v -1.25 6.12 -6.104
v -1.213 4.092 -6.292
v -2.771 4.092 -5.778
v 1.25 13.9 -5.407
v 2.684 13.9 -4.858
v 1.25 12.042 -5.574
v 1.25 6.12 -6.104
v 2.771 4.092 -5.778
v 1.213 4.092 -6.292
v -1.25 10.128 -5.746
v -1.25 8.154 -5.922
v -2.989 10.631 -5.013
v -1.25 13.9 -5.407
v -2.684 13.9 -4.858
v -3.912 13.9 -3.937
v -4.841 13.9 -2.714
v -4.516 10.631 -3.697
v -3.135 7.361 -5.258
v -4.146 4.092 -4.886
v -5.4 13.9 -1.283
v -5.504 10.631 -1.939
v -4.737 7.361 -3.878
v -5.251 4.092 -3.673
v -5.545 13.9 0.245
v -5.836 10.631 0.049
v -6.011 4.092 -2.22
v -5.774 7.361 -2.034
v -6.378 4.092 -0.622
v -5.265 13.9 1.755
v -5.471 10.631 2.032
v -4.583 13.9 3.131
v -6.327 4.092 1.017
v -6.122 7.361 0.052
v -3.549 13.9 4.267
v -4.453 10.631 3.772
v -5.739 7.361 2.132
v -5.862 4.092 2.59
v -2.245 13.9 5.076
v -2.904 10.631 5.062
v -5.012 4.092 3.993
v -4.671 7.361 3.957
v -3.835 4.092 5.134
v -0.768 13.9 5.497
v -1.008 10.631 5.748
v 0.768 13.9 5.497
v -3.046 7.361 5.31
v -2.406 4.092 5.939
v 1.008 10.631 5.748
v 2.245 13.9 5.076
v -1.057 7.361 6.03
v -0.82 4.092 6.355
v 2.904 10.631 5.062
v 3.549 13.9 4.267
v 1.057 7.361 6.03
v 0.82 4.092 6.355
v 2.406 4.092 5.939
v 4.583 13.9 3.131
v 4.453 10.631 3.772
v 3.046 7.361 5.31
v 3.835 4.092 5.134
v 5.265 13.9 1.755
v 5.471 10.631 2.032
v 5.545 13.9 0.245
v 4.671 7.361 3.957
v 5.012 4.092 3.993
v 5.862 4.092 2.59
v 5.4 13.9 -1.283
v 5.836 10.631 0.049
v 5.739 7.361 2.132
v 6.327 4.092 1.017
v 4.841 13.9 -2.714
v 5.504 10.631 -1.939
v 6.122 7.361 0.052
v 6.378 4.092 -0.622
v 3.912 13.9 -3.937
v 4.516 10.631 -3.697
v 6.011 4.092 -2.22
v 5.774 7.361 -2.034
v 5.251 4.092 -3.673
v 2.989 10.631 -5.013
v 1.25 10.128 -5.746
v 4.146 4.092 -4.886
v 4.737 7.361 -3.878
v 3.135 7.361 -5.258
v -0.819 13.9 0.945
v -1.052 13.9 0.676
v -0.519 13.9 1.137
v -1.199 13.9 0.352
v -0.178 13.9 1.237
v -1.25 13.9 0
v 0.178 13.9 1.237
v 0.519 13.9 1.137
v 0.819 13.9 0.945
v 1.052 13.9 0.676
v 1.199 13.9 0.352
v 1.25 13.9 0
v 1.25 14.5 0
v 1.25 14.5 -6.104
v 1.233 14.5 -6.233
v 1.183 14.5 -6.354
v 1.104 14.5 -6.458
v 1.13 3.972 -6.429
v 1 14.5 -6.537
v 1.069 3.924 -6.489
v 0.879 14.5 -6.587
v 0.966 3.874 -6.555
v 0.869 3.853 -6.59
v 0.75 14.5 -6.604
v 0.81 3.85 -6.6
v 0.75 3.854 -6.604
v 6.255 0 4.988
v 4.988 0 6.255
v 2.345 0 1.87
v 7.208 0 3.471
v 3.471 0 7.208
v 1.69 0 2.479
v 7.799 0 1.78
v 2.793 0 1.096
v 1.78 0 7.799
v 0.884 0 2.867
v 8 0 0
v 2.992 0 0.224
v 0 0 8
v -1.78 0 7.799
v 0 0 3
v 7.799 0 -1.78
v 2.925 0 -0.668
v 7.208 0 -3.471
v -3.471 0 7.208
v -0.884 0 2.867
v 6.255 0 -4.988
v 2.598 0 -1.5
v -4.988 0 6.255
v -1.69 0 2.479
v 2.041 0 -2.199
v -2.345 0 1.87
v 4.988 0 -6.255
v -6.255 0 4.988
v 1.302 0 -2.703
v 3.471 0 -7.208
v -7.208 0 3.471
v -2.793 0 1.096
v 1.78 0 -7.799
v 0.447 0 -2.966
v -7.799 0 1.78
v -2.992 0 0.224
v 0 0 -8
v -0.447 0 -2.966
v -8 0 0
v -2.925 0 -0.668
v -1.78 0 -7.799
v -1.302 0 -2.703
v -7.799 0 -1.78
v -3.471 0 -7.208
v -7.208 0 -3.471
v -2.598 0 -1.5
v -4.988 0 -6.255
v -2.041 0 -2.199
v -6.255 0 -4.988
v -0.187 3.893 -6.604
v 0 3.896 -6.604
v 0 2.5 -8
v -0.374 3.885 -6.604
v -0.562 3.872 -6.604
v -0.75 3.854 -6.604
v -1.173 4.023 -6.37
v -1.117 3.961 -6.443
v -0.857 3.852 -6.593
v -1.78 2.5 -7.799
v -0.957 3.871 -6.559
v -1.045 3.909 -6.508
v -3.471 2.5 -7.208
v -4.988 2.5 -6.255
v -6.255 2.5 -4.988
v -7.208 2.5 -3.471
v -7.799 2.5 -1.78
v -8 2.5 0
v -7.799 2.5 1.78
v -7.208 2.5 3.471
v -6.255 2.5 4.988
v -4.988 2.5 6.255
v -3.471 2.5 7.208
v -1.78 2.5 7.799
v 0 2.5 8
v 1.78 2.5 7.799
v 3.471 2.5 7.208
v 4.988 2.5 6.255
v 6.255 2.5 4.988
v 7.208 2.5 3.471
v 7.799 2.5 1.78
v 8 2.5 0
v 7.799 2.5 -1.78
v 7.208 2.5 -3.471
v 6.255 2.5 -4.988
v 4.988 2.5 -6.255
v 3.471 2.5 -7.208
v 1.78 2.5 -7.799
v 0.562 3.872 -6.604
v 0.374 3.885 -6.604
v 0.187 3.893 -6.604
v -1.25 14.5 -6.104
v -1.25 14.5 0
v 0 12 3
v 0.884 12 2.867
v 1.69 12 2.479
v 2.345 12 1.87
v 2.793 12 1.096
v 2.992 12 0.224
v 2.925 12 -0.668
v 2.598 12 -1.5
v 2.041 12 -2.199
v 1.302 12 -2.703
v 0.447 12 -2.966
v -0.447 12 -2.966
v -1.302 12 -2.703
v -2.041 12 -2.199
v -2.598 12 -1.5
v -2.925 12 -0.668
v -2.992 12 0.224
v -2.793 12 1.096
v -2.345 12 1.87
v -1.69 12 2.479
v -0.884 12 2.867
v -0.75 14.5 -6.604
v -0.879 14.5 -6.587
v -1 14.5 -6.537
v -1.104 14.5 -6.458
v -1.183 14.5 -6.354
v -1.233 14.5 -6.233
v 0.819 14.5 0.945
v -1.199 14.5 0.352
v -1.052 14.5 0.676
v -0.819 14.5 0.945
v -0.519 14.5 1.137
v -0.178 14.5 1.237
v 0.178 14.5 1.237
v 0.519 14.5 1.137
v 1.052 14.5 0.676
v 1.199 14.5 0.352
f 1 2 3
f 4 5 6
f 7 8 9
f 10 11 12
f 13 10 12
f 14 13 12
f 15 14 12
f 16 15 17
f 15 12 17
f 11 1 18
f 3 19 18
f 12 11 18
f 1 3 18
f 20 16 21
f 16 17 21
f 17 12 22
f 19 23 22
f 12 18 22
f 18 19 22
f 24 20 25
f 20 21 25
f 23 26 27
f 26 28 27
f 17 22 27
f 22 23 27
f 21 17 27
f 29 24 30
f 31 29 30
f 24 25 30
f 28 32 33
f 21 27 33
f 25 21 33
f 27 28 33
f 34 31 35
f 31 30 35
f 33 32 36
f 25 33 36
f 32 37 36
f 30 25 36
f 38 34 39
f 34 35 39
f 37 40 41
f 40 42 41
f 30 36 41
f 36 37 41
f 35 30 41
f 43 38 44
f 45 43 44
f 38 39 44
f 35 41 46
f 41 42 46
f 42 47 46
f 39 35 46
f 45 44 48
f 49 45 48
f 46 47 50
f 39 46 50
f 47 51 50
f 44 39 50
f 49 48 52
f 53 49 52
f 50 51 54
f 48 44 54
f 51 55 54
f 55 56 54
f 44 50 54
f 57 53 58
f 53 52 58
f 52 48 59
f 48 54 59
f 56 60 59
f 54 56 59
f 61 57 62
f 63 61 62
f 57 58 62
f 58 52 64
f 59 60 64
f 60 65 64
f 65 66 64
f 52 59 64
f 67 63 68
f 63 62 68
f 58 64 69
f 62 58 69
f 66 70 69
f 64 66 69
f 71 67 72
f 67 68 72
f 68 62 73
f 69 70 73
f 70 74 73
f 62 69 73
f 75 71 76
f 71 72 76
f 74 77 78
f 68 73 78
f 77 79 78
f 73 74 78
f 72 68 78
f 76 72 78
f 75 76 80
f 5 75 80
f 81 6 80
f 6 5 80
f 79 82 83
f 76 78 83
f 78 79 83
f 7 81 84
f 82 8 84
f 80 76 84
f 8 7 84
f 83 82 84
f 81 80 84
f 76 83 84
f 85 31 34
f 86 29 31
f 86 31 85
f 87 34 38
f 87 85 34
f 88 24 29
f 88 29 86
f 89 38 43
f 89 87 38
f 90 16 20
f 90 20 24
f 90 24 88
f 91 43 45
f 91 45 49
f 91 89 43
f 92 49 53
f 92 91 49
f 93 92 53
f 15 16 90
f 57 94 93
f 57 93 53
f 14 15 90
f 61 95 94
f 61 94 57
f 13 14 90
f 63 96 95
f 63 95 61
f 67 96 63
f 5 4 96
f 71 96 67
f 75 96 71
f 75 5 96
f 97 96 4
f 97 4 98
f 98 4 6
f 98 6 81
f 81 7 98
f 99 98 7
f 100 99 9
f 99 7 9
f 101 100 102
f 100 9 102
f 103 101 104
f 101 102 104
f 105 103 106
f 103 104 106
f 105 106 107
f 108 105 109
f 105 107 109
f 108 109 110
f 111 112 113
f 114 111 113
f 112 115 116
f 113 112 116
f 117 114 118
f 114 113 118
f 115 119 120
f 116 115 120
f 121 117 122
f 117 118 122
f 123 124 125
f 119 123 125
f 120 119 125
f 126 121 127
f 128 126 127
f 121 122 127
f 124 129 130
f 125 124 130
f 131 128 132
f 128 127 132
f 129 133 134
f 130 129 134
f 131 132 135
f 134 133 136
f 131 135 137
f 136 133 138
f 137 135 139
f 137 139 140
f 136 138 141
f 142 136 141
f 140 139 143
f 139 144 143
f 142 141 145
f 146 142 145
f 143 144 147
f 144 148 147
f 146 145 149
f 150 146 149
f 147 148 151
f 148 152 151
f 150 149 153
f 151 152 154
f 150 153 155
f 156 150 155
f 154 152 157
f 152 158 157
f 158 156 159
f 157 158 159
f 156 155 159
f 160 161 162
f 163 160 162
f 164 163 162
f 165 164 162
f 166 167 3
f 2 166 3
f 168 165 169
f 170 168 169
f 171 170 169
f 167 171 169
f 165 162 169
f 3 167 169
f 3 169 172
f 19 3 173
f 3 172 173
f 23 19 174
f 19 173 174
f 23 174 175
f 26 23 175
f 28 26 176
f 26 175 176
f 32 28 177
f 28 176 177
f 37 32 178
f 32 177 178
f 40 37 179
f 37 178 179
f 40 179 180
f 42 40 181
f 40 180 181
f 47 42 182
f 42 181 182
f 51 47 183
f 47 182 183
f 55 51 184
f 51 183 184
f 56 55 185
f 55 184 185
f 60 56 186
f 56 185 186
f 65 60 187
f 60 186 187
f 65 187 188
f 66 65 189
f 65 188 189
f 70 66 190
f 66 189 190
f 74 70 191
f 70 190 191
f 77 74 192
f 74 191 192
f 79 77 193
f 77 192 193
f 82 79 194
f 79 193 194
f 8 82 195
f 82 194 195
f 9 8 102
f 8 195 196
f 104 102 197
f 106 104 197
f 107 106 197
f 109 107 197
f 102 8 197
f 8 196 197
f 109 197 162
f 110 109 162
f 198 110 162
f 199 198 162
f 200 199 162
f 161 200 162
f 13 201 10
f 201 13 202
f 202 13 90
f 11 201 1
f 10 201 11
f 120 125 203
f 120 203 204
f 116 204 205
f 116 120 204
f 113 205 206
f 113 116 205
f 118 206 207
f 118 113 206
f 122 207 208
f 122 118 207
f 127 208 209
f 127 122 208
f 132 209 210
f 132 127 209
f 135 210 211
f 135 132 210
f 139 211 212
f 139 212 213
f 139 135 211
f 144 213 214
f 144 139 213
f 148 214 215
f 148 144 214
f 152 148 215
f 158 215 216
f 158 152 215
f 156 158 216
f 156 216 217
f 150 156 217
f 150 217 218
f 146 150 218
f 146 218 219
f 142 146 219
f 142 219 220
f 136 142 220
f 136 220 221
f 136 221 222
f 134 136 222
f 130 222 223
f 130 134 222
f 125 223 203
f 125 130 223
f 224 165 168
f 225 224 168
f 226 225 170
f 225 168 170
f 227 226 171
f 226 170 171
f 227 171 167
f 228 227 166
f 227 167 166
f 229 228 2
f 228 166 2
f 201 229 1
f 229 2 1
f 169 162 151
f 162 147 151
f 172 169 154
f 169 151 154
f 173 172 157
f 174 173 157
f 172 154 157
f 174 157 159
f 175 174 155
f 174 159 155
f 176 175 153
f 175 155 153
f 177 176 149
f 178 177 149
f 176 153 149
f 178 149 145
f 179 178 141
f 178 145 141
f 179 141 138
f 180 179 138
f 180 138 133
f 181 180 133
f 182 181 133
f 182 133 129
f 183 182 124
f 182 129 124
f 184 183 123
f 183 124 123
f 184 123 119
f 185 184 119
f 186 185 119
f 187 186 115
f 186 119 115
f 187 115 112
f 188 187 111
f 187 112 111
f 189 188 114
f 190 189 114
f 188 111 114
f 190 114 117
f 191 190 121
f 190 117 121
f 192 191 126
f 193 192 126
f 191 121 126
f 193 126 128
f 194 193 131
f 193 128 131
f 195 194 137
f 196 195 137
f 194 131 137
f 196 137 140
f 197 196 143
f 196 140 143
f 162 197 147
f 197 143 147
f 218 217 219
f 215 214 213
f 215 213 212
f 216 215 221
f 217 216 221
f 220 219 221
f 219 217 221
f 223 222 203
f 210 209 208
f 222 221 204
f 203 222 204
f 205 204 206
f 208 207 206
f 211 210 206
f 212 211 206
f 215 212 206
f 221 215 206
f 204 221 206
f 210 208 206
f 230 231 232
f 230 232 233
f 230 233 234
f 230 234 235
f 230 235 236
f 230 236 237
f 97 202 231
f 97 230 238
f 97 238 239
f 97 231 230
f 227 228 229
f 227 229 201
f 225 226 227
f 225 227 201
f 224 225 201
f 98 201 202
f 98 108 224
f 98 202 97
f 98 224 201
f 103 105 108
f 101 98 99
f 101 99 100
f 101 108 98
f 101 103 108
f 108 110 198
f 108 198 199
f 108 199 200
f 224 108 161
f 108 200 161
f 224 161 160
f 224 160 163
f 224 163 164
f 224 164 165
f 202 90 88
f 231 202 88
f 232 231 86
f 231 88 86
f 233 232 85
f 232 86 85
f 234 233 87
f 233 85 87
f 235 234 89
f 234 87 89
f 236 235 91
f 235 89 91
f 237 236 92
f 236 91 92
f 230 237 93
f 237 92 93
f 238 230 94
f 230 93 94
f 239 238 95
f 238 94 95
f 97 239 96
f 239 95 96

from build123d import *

# Parameters (mm, degrees)
BOSS_EXTRUDE1_REACH             = 19.922
BOSS_EXTRUDE1_DIRECTION_2_DEPTH = 0.6
SKETCH3_R                       = 3
CUT_EXTRUDE1_DEPTH              = 12


with BuildPart() as part:
    # Sketch1 → Revolve1 (revolve)
    with BuildSketch(Plane.XY):
        Polygon((0, 13.9), (5.55, 13.9), (6.408097327, 4.091902673), (8, 2.5), (8, 0), (0, 0), align=None)
    revolve(axis=Axis((0, 0, 0), (0, 1, 0)))

    # Sketch2 → Boss-Extrude1 (add, up to next)
    with BuildSketch(Plane(origin=(0, 13.9, 0), x_dir=(1, 0, 0), z_dir=(0, 1, 0)), mode=Mode.PRIVATE) as boss_extrude1_sk1:
        with BuildLine():
            Line((-1.25000004, 6.104), (-1.25000004, 0))
            ThreePointArc((-1.25000004, 0), (0, -1.25000004), (1.25000004, 0))
            Line((1.25000004, 0), (1.25000004, 6.104))
            ThreePointArc((1.25000004, 6.104), (1.103553431, 6.457553391), (0.75000004, 6.604))
            Line((0.75000004, 6.604), (-0.75000004, 6.604))
            ThreePointArc((-0.75000004, 6.604), (-1.103553431, 6.457553391), (-1.25000004, 6.104))
        make_face()
    boss_extrude1_tool1 = extrude(boss_extrude1_sk1.sketch, amount=-BOSS_EXTRUDE1_REACH, mode=Mode.PRIVATE) - part.part
    add(boss_extrude1_tool1.solids().sort_by_distance((0, 13.9, -2.78502))[0])

    # Sketch2 → Boss-Extrude1 direction 2 (add)
    with BuildSketch(Plane(origin=(0, 13.9, 0), x_dir=(1, 0, 0), z_dir=(0, 1, 0))):
        with BuildLine():
            Line((-1.25000004, 6.104), (-1.25000004, 0))
            ThreePointArc((-1.25000004, 0), (0, -1.25000004), (1.25000004, 0))
            Line((1.25000004, 0), (1.25000004, 6.104))
            ThreePointArc((1.25000004, 6.104), (1.103553431, 6.457553391), (0.75000004, 6.604))
            Line((0.75000004, 6.604), (-0.75000004, 6.604))
            ThreePointArc((-0.75000004, 6.604), (-1.103553431, 6.457553391), (-1.25000004, 6.104))
        make_face()
    extrude(amount=BOSS_EXTRUDE1_DIRECTION_2_DEPTH)

    # Sketch3 → Cut-Extrude1 (cut)
    with BuildSketch(Plane(origin=(0, 0, 0), x_dir=(1, 0, 0), z_dir=(0, 1, 0))):
        Circle(SKETCH3_R)
    extrude(amount=CUT_EXTRUDE1_DEPTH, mode=Mode.SUBTRACT)


solid = part.part
